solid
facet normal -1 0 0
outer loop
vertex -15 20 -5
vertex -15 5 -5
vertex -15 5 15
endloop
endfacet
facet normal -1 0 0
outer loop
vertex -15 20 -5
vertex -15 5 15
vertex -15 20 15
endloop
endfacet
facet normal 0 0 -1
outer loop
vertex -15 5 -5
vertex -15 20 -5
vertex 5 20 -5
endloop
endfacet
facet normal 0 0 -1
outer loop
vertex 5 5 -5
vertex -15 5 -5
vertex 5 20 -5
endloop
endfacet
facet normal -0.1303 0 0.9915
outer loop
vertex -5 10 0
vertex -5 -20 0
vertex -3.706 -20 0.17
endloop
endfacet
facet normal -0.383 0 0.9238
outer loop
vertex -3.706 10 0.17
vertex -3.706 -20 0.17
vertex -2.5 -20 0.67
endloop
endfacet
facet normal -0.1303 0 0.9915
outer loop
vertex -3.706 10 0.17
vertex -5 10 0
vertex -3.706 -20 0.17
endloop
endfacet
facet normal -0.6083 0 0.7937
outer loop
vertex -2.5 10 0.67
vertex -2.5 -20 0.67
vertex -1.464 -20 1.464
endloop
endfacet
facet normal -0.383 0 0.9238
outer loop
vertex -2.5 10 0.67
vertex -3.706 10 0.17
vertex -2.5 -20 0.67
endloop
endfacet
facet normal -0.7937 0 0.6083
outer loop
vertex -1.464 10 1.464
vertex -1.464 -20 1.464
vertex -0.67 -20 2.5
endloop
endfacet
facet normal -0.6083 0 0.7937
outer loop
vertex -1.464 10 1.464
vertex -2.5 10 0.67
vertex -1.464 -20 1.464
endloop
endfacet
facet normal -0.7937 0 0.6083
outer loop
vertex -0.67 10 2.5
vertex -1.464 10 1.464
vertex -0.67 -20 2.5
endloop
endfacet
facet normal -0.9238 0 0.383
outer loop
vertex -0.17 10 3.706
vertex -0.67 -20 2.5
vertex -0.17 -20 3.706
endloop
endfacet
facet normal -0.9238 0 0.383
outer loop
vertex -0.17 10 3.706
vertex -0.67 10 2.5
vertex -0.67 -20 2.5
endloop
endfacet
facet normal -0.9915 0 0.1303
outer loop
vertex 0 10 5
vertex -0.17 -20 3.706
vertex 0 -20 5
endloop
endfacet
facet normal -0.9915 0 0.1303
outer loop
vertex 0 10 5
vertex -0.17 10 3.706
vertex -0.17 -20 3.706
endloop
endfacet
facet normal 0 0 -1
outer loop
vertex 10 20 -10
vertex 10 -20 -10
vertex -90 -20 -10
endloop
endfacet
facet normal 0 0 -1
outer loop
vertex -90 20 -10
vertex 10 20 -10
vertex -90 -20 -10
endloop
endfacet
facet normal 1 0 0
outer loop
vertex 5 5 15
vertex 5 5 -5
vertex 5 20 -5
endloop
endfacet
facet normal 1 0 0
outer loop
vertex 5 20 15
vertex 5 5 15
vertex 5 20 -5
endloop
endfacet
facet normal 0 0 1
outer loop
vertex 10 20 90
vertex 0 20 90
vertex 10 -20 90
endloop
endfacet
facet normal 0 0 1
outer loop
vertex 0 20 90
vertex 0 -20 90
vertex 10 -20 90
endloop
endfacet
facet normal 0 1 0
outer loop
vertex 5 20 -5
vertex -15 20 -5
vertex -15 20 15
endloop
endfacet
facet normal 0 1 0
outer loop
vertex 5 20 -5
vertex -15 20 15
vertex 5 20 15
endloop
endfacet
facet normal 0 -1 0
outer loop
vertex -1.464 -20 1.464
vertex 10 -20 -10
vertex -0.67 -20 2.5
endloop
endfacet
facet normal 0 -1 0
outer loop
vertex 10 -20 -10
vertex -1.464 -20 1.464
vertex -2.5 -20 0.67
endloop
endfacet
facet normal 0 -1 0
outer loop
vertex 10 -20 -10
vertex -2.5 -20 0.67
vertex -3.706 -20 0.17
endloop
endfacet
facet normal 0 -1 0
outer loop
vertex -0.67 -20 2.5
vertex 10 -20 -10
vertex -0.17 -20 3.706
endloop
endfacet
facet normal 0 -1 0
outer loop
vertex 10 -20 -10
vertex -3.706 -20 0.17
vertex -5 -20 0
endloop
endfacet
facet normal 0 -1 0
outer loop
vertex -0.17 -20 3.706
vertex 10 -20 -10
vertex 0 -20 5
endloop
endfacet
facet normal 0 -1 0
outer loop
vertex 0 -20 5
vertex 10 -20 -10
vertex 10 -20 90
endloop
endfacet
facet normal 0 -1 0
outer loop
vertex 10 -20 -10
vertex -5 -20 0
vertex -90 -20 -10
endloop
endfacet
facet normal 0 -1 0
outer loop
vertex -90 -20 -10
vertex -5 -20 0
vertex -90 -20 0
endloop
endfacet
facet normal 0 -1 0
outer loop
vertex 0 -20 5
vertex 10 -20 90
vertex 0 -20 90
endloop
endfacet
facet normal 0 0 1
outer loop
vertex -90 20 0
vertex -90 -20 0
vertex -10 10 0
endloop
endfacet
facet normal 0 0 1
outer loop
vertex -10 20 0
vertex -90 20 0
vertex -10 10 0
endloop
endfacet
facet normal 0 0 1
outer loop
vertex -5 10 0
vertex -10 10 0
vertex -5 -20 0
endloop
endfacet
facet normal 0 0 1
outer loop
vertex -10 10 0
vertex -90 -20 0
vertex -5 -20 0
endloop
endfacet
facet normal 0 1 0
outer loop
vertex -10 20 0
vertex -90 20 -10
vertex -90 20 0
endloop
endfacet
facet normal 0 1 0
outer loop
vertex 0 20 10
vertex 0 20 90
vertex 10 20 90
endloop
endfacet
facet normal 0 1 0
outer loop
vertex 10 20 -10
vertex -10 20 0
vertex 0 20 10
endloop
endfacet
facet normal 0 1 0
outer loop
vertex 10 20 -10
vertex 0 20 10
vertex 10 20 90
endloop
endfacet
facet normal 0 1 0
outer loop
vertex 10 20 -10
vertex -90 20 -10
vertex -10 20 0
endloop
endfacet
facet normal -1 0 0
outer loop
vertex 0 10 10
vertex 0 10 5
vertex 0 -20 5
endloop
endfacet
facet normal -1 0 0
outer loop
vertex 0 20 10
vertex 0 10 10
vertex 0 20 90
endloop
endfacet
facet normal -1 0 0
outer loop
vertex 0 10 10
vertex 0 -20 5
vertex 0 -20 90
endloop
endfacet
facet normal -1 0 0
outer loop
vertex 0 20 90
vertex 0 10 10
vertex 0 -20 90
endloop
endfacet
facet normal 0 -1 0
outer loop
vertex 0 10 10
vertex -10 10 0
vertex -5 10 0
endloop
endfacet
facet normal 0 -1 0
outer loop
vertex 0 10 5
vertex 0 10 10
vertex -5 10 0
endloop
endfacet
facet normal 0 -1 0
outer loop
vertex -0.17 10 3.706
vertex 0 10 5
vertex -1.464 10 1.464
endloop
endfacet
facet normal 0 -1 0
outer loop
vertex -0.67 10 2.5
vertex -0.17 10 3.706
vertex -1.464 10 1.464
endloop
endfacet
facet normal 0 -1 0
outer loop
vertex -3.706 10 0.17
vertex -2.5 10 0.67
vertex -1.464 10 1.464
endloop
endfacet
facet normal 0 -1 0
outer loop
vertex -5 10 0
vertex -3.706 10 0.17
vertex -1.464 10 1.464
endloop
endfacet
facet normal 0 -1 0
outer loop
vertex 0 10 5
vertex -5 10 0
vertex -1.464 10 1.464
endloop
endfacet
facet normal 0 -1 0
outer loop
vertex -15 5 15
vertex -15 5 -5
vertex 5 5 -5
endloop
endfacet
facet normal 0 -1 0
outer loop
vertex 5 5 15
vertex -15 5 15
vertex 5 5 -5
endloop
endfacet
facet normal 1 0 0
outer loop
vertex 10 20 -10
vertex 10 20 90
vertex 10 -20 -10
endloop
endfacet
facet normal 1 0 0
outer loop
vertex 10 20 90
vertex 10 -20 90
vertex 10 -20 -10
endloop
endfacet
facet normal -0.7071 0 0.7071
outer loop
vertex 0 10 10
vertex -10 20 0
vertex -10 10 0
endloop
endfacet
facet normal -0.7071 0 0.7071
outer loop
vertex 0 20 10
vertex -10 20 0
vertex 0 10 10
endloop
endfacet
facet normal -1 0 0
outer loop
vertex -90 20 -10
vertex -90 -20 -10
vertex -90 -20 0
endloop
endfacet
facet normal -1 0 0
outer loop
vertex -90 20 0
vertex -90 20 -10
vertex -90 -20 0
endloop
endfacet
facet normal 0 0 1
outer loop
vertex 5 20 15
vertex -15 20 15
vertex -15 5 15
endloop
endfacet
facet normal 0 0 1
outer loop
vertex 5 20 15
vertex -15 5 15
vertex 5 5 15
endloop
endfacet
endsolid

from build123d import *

# Parameters (mm, degrees)
PAD_DEPTH    = 20
FILLET_R     = 5
PAD001_DEPTH = 10
BOX_W        = 20
BOX_H        = 15
BOX_DEPTH    = 20


with BuildPart() as body:
    # Sketch → Pad (new body, symmetric)
    with BuildSketch(Plane.XZ):
        Polygon((-90, 0), (0, 0), (0, 90), (10, 90), (10, -10), (-90, -10), align=None)
    extrude(amount=PAD_DEPTH, both=True)

    # Fillet
    fillet_edges = [body.edges().sort_by_distance(p)[0] for p in [
        (0, 0, 0),
    ]]
    fillet(fillet_edges, radius=FILLET_R)

    # Sketch001 (on Face2 of Fillet) → Pad001 (join)
    with BuildSketch(Plane(origin=(0, 20, 0), x_dir=(1, 0, 0), z_dir=(0, 1, 0))):
        Polygon((-10, 0), (0, -10), (0, 0), align=None)
    extrude(amount=-PAD001_DEPTH)


with BuildPart() as box:
    # Box → Box (new body)
    with BuildSketch(Plane(origin=(-15, 5, -5), x_dir=(1, 0, 0), z_dir=(0, 0, 1))):
        with Locations((10, 7.5)):
            Rectangle(BOX_W, BOX_H)
    extrude(amount=BOX_DEPTH)


solid = Compound([body.part, box.part])
